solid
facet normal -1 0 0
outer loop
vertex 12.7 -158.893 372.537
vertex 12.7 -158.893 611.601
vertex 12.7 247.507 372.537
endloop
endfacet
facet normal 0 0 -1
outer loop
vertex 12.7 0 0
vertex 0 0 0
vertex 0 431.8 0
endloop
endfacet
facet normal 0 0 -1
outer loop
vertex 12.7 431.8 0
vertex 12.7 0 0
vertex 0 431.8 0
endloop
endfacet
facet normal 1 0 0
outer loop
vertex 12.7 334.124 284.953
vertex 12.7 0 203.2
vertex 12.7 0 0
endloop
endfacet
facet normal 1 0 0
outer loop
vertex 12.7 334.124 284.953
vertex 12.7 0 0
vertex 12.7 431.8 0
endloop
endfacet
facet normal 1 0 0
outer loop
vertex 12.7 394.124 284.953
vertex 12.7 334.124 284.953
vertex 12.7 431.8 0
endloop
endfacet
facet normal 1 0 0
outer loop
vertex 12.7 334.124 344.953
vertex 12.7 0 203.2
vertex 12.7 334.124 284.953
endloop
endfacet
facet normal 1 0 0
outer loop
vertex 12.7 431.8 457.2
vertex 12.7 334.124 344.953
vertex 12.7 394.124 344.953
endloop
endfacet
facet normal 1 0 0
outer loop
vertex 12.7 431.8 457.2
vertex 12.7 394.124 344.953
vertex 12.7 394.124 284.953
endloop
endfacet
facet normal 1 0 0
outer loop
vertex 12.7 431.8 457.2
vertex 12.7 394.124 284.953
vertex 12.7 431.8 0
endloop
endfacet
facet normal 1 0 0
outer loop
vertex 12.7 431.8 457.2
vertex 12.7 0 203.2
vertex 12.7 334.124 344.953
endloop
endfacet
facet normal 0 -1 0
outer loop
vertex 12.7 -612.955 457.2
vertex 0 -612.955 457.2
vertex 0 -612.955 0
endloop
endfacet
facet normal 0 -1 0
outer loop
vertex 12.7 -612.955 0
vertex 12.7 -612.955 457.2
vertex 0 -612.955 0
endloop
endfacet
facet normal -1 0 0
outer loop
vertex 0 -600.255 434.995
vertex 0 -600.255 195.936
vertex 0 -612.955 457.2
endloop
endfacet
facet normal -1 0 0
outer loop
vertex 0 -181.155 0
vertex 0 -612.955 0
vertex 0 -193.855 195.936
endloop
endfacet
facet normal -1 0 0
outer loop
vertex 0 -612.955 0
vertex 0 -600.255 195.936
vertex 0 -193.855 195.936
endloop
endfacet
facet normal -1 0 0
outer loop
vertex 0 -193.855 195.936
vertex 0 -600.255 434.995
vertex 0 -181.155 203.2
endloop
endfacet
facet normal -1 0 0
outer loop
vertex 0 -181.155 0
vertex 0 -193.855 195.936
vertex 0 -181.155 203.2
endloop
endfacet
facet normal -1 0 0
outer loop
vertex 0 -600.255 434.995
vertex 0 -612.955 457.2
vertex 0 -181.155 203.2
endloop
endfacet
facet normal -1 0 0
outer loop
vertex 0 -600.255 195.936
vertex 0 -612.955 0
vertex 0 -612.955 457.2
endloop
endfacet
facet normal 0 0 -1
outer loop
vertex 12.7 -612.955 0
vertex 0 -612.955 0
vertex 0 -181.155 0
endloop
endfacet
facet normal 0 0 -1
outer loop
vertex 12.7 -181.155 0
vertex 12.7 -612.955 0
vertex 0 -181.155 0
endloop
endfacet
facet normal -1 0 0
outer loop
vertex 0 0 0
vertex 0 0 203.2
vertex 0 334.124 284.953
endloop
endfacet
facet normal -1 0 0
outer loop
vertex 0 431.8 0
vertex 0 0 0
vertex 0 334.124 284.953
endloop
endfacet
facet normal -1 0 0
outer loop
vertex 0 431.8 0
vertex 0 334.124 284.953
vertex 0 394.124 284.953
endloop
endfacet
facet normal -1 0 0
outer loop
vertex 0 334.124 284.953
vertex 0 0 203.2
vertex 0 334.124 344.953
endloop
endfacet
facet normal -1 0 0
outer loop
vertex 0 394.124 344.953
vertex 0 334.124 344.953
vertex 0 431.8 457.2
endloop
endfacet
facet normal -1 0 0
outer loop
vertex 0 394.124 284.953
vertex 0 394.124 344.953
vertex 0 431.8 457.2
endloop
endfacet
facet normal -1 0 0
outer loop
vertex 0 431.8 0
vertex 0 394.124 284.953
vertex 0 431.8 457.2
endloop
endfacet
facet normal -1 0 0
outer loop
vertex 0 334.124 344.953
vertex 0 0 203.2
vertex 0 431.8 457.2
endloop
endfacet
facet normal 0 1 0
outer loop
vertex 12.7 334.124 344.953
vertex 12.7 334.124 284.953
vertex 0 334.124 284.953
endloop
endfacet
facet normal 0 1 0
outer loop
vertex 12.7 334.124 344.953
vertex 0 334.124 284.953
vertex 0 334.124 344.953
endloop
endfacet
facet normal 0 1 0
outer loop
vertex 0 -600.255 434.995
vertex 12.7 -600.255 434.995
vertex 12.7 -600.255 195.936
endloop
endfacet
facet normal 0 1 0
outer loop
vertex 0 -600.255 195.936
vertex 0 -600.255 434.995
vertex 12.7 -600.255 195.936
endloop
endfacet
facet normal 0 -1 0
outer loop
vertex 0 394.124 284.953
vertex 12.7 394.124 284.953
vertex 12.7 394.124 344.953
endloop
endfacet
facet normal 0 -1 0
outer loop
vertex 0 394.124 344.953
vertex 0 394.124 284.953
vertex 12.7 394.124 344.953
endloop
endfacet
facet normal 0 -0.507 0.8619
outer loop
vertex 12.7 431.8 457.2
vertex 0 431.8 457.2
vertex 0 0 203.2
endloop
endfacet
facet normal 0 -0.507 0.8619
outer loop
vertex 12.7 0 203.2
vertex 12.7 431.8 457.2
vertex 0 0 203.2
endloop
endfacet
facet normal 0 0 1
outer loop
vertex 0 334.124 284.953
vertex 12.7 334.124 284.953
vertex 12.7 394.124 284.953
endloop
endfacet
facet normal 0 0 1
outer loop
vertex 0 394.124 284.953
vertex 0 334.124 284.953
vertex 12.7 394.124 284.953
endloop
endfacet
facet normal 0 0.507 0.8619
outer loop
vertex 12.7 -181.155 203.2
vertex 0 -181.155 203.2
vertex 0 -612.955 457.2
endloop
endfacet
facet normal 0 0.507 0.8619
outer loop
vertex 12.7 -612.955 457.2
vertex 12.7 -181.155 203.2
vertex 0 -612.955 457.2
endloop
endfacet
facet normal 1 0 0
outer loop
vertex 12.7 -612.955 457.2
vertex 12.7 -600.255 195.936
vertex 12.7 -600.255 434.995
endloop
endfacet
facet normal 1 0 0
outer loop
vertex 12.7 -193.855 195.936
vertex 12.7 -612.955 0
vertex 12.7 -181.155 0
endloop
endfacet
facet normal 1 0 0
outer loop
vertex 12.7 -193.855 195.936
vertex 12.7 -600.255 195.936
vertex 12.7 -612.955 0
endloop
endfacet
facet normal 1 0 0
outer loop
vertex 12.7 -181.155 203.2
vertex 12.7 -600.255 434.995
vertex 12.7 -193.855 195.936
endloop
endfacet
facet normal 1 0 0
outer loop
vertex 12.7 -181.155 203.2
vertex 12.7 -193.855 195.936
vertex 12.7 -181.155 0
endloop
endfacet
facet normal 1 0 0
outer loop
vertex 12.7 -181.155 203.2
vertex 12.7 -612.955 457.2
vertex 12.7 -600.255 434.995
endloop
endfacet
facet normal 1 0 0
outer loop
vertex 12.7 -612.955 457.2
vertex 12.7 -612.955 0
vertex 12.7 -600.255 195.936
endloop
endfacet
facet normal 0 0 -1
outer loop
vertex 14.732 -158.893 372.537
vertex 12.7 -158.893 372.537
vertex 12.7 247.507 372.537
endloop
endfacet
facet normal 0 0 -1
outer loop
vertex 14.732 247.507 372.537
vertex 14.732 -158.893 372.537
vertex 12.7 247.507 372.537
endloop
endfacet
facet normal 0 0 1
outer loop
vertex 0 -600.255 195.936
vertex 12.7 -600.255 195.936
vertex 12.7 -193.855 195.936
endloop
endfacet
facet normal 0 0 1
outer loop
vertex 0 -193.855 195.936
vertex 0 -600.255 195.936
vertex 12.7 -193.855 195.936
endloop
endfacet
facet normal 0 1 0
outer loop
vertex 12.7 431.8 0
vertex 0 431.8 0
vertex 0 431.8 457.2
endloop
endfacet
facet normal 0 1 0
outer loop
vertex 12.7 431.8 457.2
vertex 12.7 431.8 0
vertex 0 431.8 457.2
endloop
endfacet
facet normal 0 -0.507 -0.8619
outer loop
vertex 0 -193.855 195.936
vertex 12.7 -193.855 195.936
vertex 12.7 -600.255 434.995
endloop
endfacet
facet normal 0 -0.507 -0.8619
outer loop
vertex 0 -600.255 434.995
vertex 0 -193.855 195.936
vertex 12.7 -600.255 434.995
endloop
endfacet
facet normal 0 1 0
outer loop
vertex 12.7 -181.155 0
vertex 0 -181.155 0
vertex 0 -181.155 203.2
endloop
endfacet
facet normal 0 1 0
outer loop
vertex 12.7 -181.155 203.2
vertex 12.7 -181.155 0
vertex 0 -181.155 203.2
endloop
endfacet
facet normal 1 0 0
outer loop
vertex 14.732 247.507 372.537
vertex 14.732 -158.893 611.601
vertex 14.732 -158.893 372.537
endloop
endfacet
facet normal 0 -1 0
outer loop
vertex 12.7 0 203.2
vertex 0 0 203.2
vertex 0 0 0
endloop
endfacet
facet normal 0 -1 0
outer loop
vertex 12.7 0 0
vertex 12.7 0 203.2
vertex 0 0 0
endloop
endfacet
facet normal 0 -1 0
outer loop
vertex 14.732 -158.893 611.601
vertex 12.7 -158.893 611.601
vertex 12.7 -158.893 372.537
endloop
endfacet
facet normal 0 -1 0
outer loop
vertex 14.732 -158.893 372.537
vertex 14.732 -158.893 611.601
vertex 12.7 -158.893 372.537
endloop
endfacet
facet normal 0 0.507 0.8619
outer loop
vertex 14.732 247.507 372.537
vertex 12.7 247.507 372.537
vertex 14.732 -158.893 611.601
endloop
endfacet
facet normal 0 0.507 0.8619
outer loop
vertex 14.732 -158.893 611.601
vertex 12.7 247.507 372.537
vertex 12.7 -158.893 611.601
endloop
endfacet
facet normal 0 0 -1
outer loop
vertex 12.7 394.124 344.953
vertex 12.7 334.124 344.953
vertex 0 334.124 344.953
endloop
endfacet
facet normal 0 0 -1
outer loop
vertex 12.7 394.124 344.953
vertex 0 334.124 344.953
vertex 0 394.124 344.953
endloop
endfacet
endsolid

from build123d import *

# Parameters (mm, degrees)
F1_DEPTH = 12.7
F2_DEPTH = 12.7
F3_W     = 60
F3_H     = 60
F4_DEPTH = 25.4
F6_DEPTH = 2.032
F7_DEPTH = 25.4


# Not quite as in the source:
# - a length typed as a fraction of an inch, garbled in the dataset ("3 / 203.2 mm" for 3/8 in), is restored


with BuildPart() as f1:
    # F0 (on Right) → F1 (new body)
    with BuildSketch(Plane.YZ):
        Polygon((-612.9547357559, 0), (-181.1547357559, 0), (-181.1547357559, 203.2), (-612.9547357559, 457.2), align=None)
    extrude(amount=F1_DEPTH)

    # F5 (on face) → F7 (cut)
    with BuildSketch(Plane.YZ.offset(12.7)):
        Polygon((-193.8547357559, 195.9362851102), (-600.2547357559, 434.9951086396), (-600.2547357559, 195.9362851102), align=None)
    extrude(amount=-F7_DEPTH, mode=Mode.SUBTRACT)


with BuildPart() as f2:
    # F0 (on Right) → F2 (new body)
    with BuildSketch(Plane.YZ):
        Polygon((0, 203.2), (0, 0), (431.8, 0), (431.8, 457.2), align=None)
    extrude(amount=F2_DEPTH)

    # F3 (on face) → F4 (cut)
    with BuildSketch(Plane.YZ.offset(12.7)):
        with Locations((364.1244322062, 314.9529779075)):
            Rectangle(F3_W, F3_H)
    extrude(amount=-F4_DEPTH, mode=Mode.SUBTRACT)


with BuildPart() as f6:
    # F5 (on face) → F6 (new body)
    with BuildSketch(Plane.YZ.offset(12.7)):
        Polygon((247.5073088646, 372.5366592407), (-158.8926911354, 611.6014592407), (-158.8926911354, 372.5366592407), align=None)
    extrude(amount=F6_DEPTH)


solid = Compound([f1.part, f2.part, f6.part])
